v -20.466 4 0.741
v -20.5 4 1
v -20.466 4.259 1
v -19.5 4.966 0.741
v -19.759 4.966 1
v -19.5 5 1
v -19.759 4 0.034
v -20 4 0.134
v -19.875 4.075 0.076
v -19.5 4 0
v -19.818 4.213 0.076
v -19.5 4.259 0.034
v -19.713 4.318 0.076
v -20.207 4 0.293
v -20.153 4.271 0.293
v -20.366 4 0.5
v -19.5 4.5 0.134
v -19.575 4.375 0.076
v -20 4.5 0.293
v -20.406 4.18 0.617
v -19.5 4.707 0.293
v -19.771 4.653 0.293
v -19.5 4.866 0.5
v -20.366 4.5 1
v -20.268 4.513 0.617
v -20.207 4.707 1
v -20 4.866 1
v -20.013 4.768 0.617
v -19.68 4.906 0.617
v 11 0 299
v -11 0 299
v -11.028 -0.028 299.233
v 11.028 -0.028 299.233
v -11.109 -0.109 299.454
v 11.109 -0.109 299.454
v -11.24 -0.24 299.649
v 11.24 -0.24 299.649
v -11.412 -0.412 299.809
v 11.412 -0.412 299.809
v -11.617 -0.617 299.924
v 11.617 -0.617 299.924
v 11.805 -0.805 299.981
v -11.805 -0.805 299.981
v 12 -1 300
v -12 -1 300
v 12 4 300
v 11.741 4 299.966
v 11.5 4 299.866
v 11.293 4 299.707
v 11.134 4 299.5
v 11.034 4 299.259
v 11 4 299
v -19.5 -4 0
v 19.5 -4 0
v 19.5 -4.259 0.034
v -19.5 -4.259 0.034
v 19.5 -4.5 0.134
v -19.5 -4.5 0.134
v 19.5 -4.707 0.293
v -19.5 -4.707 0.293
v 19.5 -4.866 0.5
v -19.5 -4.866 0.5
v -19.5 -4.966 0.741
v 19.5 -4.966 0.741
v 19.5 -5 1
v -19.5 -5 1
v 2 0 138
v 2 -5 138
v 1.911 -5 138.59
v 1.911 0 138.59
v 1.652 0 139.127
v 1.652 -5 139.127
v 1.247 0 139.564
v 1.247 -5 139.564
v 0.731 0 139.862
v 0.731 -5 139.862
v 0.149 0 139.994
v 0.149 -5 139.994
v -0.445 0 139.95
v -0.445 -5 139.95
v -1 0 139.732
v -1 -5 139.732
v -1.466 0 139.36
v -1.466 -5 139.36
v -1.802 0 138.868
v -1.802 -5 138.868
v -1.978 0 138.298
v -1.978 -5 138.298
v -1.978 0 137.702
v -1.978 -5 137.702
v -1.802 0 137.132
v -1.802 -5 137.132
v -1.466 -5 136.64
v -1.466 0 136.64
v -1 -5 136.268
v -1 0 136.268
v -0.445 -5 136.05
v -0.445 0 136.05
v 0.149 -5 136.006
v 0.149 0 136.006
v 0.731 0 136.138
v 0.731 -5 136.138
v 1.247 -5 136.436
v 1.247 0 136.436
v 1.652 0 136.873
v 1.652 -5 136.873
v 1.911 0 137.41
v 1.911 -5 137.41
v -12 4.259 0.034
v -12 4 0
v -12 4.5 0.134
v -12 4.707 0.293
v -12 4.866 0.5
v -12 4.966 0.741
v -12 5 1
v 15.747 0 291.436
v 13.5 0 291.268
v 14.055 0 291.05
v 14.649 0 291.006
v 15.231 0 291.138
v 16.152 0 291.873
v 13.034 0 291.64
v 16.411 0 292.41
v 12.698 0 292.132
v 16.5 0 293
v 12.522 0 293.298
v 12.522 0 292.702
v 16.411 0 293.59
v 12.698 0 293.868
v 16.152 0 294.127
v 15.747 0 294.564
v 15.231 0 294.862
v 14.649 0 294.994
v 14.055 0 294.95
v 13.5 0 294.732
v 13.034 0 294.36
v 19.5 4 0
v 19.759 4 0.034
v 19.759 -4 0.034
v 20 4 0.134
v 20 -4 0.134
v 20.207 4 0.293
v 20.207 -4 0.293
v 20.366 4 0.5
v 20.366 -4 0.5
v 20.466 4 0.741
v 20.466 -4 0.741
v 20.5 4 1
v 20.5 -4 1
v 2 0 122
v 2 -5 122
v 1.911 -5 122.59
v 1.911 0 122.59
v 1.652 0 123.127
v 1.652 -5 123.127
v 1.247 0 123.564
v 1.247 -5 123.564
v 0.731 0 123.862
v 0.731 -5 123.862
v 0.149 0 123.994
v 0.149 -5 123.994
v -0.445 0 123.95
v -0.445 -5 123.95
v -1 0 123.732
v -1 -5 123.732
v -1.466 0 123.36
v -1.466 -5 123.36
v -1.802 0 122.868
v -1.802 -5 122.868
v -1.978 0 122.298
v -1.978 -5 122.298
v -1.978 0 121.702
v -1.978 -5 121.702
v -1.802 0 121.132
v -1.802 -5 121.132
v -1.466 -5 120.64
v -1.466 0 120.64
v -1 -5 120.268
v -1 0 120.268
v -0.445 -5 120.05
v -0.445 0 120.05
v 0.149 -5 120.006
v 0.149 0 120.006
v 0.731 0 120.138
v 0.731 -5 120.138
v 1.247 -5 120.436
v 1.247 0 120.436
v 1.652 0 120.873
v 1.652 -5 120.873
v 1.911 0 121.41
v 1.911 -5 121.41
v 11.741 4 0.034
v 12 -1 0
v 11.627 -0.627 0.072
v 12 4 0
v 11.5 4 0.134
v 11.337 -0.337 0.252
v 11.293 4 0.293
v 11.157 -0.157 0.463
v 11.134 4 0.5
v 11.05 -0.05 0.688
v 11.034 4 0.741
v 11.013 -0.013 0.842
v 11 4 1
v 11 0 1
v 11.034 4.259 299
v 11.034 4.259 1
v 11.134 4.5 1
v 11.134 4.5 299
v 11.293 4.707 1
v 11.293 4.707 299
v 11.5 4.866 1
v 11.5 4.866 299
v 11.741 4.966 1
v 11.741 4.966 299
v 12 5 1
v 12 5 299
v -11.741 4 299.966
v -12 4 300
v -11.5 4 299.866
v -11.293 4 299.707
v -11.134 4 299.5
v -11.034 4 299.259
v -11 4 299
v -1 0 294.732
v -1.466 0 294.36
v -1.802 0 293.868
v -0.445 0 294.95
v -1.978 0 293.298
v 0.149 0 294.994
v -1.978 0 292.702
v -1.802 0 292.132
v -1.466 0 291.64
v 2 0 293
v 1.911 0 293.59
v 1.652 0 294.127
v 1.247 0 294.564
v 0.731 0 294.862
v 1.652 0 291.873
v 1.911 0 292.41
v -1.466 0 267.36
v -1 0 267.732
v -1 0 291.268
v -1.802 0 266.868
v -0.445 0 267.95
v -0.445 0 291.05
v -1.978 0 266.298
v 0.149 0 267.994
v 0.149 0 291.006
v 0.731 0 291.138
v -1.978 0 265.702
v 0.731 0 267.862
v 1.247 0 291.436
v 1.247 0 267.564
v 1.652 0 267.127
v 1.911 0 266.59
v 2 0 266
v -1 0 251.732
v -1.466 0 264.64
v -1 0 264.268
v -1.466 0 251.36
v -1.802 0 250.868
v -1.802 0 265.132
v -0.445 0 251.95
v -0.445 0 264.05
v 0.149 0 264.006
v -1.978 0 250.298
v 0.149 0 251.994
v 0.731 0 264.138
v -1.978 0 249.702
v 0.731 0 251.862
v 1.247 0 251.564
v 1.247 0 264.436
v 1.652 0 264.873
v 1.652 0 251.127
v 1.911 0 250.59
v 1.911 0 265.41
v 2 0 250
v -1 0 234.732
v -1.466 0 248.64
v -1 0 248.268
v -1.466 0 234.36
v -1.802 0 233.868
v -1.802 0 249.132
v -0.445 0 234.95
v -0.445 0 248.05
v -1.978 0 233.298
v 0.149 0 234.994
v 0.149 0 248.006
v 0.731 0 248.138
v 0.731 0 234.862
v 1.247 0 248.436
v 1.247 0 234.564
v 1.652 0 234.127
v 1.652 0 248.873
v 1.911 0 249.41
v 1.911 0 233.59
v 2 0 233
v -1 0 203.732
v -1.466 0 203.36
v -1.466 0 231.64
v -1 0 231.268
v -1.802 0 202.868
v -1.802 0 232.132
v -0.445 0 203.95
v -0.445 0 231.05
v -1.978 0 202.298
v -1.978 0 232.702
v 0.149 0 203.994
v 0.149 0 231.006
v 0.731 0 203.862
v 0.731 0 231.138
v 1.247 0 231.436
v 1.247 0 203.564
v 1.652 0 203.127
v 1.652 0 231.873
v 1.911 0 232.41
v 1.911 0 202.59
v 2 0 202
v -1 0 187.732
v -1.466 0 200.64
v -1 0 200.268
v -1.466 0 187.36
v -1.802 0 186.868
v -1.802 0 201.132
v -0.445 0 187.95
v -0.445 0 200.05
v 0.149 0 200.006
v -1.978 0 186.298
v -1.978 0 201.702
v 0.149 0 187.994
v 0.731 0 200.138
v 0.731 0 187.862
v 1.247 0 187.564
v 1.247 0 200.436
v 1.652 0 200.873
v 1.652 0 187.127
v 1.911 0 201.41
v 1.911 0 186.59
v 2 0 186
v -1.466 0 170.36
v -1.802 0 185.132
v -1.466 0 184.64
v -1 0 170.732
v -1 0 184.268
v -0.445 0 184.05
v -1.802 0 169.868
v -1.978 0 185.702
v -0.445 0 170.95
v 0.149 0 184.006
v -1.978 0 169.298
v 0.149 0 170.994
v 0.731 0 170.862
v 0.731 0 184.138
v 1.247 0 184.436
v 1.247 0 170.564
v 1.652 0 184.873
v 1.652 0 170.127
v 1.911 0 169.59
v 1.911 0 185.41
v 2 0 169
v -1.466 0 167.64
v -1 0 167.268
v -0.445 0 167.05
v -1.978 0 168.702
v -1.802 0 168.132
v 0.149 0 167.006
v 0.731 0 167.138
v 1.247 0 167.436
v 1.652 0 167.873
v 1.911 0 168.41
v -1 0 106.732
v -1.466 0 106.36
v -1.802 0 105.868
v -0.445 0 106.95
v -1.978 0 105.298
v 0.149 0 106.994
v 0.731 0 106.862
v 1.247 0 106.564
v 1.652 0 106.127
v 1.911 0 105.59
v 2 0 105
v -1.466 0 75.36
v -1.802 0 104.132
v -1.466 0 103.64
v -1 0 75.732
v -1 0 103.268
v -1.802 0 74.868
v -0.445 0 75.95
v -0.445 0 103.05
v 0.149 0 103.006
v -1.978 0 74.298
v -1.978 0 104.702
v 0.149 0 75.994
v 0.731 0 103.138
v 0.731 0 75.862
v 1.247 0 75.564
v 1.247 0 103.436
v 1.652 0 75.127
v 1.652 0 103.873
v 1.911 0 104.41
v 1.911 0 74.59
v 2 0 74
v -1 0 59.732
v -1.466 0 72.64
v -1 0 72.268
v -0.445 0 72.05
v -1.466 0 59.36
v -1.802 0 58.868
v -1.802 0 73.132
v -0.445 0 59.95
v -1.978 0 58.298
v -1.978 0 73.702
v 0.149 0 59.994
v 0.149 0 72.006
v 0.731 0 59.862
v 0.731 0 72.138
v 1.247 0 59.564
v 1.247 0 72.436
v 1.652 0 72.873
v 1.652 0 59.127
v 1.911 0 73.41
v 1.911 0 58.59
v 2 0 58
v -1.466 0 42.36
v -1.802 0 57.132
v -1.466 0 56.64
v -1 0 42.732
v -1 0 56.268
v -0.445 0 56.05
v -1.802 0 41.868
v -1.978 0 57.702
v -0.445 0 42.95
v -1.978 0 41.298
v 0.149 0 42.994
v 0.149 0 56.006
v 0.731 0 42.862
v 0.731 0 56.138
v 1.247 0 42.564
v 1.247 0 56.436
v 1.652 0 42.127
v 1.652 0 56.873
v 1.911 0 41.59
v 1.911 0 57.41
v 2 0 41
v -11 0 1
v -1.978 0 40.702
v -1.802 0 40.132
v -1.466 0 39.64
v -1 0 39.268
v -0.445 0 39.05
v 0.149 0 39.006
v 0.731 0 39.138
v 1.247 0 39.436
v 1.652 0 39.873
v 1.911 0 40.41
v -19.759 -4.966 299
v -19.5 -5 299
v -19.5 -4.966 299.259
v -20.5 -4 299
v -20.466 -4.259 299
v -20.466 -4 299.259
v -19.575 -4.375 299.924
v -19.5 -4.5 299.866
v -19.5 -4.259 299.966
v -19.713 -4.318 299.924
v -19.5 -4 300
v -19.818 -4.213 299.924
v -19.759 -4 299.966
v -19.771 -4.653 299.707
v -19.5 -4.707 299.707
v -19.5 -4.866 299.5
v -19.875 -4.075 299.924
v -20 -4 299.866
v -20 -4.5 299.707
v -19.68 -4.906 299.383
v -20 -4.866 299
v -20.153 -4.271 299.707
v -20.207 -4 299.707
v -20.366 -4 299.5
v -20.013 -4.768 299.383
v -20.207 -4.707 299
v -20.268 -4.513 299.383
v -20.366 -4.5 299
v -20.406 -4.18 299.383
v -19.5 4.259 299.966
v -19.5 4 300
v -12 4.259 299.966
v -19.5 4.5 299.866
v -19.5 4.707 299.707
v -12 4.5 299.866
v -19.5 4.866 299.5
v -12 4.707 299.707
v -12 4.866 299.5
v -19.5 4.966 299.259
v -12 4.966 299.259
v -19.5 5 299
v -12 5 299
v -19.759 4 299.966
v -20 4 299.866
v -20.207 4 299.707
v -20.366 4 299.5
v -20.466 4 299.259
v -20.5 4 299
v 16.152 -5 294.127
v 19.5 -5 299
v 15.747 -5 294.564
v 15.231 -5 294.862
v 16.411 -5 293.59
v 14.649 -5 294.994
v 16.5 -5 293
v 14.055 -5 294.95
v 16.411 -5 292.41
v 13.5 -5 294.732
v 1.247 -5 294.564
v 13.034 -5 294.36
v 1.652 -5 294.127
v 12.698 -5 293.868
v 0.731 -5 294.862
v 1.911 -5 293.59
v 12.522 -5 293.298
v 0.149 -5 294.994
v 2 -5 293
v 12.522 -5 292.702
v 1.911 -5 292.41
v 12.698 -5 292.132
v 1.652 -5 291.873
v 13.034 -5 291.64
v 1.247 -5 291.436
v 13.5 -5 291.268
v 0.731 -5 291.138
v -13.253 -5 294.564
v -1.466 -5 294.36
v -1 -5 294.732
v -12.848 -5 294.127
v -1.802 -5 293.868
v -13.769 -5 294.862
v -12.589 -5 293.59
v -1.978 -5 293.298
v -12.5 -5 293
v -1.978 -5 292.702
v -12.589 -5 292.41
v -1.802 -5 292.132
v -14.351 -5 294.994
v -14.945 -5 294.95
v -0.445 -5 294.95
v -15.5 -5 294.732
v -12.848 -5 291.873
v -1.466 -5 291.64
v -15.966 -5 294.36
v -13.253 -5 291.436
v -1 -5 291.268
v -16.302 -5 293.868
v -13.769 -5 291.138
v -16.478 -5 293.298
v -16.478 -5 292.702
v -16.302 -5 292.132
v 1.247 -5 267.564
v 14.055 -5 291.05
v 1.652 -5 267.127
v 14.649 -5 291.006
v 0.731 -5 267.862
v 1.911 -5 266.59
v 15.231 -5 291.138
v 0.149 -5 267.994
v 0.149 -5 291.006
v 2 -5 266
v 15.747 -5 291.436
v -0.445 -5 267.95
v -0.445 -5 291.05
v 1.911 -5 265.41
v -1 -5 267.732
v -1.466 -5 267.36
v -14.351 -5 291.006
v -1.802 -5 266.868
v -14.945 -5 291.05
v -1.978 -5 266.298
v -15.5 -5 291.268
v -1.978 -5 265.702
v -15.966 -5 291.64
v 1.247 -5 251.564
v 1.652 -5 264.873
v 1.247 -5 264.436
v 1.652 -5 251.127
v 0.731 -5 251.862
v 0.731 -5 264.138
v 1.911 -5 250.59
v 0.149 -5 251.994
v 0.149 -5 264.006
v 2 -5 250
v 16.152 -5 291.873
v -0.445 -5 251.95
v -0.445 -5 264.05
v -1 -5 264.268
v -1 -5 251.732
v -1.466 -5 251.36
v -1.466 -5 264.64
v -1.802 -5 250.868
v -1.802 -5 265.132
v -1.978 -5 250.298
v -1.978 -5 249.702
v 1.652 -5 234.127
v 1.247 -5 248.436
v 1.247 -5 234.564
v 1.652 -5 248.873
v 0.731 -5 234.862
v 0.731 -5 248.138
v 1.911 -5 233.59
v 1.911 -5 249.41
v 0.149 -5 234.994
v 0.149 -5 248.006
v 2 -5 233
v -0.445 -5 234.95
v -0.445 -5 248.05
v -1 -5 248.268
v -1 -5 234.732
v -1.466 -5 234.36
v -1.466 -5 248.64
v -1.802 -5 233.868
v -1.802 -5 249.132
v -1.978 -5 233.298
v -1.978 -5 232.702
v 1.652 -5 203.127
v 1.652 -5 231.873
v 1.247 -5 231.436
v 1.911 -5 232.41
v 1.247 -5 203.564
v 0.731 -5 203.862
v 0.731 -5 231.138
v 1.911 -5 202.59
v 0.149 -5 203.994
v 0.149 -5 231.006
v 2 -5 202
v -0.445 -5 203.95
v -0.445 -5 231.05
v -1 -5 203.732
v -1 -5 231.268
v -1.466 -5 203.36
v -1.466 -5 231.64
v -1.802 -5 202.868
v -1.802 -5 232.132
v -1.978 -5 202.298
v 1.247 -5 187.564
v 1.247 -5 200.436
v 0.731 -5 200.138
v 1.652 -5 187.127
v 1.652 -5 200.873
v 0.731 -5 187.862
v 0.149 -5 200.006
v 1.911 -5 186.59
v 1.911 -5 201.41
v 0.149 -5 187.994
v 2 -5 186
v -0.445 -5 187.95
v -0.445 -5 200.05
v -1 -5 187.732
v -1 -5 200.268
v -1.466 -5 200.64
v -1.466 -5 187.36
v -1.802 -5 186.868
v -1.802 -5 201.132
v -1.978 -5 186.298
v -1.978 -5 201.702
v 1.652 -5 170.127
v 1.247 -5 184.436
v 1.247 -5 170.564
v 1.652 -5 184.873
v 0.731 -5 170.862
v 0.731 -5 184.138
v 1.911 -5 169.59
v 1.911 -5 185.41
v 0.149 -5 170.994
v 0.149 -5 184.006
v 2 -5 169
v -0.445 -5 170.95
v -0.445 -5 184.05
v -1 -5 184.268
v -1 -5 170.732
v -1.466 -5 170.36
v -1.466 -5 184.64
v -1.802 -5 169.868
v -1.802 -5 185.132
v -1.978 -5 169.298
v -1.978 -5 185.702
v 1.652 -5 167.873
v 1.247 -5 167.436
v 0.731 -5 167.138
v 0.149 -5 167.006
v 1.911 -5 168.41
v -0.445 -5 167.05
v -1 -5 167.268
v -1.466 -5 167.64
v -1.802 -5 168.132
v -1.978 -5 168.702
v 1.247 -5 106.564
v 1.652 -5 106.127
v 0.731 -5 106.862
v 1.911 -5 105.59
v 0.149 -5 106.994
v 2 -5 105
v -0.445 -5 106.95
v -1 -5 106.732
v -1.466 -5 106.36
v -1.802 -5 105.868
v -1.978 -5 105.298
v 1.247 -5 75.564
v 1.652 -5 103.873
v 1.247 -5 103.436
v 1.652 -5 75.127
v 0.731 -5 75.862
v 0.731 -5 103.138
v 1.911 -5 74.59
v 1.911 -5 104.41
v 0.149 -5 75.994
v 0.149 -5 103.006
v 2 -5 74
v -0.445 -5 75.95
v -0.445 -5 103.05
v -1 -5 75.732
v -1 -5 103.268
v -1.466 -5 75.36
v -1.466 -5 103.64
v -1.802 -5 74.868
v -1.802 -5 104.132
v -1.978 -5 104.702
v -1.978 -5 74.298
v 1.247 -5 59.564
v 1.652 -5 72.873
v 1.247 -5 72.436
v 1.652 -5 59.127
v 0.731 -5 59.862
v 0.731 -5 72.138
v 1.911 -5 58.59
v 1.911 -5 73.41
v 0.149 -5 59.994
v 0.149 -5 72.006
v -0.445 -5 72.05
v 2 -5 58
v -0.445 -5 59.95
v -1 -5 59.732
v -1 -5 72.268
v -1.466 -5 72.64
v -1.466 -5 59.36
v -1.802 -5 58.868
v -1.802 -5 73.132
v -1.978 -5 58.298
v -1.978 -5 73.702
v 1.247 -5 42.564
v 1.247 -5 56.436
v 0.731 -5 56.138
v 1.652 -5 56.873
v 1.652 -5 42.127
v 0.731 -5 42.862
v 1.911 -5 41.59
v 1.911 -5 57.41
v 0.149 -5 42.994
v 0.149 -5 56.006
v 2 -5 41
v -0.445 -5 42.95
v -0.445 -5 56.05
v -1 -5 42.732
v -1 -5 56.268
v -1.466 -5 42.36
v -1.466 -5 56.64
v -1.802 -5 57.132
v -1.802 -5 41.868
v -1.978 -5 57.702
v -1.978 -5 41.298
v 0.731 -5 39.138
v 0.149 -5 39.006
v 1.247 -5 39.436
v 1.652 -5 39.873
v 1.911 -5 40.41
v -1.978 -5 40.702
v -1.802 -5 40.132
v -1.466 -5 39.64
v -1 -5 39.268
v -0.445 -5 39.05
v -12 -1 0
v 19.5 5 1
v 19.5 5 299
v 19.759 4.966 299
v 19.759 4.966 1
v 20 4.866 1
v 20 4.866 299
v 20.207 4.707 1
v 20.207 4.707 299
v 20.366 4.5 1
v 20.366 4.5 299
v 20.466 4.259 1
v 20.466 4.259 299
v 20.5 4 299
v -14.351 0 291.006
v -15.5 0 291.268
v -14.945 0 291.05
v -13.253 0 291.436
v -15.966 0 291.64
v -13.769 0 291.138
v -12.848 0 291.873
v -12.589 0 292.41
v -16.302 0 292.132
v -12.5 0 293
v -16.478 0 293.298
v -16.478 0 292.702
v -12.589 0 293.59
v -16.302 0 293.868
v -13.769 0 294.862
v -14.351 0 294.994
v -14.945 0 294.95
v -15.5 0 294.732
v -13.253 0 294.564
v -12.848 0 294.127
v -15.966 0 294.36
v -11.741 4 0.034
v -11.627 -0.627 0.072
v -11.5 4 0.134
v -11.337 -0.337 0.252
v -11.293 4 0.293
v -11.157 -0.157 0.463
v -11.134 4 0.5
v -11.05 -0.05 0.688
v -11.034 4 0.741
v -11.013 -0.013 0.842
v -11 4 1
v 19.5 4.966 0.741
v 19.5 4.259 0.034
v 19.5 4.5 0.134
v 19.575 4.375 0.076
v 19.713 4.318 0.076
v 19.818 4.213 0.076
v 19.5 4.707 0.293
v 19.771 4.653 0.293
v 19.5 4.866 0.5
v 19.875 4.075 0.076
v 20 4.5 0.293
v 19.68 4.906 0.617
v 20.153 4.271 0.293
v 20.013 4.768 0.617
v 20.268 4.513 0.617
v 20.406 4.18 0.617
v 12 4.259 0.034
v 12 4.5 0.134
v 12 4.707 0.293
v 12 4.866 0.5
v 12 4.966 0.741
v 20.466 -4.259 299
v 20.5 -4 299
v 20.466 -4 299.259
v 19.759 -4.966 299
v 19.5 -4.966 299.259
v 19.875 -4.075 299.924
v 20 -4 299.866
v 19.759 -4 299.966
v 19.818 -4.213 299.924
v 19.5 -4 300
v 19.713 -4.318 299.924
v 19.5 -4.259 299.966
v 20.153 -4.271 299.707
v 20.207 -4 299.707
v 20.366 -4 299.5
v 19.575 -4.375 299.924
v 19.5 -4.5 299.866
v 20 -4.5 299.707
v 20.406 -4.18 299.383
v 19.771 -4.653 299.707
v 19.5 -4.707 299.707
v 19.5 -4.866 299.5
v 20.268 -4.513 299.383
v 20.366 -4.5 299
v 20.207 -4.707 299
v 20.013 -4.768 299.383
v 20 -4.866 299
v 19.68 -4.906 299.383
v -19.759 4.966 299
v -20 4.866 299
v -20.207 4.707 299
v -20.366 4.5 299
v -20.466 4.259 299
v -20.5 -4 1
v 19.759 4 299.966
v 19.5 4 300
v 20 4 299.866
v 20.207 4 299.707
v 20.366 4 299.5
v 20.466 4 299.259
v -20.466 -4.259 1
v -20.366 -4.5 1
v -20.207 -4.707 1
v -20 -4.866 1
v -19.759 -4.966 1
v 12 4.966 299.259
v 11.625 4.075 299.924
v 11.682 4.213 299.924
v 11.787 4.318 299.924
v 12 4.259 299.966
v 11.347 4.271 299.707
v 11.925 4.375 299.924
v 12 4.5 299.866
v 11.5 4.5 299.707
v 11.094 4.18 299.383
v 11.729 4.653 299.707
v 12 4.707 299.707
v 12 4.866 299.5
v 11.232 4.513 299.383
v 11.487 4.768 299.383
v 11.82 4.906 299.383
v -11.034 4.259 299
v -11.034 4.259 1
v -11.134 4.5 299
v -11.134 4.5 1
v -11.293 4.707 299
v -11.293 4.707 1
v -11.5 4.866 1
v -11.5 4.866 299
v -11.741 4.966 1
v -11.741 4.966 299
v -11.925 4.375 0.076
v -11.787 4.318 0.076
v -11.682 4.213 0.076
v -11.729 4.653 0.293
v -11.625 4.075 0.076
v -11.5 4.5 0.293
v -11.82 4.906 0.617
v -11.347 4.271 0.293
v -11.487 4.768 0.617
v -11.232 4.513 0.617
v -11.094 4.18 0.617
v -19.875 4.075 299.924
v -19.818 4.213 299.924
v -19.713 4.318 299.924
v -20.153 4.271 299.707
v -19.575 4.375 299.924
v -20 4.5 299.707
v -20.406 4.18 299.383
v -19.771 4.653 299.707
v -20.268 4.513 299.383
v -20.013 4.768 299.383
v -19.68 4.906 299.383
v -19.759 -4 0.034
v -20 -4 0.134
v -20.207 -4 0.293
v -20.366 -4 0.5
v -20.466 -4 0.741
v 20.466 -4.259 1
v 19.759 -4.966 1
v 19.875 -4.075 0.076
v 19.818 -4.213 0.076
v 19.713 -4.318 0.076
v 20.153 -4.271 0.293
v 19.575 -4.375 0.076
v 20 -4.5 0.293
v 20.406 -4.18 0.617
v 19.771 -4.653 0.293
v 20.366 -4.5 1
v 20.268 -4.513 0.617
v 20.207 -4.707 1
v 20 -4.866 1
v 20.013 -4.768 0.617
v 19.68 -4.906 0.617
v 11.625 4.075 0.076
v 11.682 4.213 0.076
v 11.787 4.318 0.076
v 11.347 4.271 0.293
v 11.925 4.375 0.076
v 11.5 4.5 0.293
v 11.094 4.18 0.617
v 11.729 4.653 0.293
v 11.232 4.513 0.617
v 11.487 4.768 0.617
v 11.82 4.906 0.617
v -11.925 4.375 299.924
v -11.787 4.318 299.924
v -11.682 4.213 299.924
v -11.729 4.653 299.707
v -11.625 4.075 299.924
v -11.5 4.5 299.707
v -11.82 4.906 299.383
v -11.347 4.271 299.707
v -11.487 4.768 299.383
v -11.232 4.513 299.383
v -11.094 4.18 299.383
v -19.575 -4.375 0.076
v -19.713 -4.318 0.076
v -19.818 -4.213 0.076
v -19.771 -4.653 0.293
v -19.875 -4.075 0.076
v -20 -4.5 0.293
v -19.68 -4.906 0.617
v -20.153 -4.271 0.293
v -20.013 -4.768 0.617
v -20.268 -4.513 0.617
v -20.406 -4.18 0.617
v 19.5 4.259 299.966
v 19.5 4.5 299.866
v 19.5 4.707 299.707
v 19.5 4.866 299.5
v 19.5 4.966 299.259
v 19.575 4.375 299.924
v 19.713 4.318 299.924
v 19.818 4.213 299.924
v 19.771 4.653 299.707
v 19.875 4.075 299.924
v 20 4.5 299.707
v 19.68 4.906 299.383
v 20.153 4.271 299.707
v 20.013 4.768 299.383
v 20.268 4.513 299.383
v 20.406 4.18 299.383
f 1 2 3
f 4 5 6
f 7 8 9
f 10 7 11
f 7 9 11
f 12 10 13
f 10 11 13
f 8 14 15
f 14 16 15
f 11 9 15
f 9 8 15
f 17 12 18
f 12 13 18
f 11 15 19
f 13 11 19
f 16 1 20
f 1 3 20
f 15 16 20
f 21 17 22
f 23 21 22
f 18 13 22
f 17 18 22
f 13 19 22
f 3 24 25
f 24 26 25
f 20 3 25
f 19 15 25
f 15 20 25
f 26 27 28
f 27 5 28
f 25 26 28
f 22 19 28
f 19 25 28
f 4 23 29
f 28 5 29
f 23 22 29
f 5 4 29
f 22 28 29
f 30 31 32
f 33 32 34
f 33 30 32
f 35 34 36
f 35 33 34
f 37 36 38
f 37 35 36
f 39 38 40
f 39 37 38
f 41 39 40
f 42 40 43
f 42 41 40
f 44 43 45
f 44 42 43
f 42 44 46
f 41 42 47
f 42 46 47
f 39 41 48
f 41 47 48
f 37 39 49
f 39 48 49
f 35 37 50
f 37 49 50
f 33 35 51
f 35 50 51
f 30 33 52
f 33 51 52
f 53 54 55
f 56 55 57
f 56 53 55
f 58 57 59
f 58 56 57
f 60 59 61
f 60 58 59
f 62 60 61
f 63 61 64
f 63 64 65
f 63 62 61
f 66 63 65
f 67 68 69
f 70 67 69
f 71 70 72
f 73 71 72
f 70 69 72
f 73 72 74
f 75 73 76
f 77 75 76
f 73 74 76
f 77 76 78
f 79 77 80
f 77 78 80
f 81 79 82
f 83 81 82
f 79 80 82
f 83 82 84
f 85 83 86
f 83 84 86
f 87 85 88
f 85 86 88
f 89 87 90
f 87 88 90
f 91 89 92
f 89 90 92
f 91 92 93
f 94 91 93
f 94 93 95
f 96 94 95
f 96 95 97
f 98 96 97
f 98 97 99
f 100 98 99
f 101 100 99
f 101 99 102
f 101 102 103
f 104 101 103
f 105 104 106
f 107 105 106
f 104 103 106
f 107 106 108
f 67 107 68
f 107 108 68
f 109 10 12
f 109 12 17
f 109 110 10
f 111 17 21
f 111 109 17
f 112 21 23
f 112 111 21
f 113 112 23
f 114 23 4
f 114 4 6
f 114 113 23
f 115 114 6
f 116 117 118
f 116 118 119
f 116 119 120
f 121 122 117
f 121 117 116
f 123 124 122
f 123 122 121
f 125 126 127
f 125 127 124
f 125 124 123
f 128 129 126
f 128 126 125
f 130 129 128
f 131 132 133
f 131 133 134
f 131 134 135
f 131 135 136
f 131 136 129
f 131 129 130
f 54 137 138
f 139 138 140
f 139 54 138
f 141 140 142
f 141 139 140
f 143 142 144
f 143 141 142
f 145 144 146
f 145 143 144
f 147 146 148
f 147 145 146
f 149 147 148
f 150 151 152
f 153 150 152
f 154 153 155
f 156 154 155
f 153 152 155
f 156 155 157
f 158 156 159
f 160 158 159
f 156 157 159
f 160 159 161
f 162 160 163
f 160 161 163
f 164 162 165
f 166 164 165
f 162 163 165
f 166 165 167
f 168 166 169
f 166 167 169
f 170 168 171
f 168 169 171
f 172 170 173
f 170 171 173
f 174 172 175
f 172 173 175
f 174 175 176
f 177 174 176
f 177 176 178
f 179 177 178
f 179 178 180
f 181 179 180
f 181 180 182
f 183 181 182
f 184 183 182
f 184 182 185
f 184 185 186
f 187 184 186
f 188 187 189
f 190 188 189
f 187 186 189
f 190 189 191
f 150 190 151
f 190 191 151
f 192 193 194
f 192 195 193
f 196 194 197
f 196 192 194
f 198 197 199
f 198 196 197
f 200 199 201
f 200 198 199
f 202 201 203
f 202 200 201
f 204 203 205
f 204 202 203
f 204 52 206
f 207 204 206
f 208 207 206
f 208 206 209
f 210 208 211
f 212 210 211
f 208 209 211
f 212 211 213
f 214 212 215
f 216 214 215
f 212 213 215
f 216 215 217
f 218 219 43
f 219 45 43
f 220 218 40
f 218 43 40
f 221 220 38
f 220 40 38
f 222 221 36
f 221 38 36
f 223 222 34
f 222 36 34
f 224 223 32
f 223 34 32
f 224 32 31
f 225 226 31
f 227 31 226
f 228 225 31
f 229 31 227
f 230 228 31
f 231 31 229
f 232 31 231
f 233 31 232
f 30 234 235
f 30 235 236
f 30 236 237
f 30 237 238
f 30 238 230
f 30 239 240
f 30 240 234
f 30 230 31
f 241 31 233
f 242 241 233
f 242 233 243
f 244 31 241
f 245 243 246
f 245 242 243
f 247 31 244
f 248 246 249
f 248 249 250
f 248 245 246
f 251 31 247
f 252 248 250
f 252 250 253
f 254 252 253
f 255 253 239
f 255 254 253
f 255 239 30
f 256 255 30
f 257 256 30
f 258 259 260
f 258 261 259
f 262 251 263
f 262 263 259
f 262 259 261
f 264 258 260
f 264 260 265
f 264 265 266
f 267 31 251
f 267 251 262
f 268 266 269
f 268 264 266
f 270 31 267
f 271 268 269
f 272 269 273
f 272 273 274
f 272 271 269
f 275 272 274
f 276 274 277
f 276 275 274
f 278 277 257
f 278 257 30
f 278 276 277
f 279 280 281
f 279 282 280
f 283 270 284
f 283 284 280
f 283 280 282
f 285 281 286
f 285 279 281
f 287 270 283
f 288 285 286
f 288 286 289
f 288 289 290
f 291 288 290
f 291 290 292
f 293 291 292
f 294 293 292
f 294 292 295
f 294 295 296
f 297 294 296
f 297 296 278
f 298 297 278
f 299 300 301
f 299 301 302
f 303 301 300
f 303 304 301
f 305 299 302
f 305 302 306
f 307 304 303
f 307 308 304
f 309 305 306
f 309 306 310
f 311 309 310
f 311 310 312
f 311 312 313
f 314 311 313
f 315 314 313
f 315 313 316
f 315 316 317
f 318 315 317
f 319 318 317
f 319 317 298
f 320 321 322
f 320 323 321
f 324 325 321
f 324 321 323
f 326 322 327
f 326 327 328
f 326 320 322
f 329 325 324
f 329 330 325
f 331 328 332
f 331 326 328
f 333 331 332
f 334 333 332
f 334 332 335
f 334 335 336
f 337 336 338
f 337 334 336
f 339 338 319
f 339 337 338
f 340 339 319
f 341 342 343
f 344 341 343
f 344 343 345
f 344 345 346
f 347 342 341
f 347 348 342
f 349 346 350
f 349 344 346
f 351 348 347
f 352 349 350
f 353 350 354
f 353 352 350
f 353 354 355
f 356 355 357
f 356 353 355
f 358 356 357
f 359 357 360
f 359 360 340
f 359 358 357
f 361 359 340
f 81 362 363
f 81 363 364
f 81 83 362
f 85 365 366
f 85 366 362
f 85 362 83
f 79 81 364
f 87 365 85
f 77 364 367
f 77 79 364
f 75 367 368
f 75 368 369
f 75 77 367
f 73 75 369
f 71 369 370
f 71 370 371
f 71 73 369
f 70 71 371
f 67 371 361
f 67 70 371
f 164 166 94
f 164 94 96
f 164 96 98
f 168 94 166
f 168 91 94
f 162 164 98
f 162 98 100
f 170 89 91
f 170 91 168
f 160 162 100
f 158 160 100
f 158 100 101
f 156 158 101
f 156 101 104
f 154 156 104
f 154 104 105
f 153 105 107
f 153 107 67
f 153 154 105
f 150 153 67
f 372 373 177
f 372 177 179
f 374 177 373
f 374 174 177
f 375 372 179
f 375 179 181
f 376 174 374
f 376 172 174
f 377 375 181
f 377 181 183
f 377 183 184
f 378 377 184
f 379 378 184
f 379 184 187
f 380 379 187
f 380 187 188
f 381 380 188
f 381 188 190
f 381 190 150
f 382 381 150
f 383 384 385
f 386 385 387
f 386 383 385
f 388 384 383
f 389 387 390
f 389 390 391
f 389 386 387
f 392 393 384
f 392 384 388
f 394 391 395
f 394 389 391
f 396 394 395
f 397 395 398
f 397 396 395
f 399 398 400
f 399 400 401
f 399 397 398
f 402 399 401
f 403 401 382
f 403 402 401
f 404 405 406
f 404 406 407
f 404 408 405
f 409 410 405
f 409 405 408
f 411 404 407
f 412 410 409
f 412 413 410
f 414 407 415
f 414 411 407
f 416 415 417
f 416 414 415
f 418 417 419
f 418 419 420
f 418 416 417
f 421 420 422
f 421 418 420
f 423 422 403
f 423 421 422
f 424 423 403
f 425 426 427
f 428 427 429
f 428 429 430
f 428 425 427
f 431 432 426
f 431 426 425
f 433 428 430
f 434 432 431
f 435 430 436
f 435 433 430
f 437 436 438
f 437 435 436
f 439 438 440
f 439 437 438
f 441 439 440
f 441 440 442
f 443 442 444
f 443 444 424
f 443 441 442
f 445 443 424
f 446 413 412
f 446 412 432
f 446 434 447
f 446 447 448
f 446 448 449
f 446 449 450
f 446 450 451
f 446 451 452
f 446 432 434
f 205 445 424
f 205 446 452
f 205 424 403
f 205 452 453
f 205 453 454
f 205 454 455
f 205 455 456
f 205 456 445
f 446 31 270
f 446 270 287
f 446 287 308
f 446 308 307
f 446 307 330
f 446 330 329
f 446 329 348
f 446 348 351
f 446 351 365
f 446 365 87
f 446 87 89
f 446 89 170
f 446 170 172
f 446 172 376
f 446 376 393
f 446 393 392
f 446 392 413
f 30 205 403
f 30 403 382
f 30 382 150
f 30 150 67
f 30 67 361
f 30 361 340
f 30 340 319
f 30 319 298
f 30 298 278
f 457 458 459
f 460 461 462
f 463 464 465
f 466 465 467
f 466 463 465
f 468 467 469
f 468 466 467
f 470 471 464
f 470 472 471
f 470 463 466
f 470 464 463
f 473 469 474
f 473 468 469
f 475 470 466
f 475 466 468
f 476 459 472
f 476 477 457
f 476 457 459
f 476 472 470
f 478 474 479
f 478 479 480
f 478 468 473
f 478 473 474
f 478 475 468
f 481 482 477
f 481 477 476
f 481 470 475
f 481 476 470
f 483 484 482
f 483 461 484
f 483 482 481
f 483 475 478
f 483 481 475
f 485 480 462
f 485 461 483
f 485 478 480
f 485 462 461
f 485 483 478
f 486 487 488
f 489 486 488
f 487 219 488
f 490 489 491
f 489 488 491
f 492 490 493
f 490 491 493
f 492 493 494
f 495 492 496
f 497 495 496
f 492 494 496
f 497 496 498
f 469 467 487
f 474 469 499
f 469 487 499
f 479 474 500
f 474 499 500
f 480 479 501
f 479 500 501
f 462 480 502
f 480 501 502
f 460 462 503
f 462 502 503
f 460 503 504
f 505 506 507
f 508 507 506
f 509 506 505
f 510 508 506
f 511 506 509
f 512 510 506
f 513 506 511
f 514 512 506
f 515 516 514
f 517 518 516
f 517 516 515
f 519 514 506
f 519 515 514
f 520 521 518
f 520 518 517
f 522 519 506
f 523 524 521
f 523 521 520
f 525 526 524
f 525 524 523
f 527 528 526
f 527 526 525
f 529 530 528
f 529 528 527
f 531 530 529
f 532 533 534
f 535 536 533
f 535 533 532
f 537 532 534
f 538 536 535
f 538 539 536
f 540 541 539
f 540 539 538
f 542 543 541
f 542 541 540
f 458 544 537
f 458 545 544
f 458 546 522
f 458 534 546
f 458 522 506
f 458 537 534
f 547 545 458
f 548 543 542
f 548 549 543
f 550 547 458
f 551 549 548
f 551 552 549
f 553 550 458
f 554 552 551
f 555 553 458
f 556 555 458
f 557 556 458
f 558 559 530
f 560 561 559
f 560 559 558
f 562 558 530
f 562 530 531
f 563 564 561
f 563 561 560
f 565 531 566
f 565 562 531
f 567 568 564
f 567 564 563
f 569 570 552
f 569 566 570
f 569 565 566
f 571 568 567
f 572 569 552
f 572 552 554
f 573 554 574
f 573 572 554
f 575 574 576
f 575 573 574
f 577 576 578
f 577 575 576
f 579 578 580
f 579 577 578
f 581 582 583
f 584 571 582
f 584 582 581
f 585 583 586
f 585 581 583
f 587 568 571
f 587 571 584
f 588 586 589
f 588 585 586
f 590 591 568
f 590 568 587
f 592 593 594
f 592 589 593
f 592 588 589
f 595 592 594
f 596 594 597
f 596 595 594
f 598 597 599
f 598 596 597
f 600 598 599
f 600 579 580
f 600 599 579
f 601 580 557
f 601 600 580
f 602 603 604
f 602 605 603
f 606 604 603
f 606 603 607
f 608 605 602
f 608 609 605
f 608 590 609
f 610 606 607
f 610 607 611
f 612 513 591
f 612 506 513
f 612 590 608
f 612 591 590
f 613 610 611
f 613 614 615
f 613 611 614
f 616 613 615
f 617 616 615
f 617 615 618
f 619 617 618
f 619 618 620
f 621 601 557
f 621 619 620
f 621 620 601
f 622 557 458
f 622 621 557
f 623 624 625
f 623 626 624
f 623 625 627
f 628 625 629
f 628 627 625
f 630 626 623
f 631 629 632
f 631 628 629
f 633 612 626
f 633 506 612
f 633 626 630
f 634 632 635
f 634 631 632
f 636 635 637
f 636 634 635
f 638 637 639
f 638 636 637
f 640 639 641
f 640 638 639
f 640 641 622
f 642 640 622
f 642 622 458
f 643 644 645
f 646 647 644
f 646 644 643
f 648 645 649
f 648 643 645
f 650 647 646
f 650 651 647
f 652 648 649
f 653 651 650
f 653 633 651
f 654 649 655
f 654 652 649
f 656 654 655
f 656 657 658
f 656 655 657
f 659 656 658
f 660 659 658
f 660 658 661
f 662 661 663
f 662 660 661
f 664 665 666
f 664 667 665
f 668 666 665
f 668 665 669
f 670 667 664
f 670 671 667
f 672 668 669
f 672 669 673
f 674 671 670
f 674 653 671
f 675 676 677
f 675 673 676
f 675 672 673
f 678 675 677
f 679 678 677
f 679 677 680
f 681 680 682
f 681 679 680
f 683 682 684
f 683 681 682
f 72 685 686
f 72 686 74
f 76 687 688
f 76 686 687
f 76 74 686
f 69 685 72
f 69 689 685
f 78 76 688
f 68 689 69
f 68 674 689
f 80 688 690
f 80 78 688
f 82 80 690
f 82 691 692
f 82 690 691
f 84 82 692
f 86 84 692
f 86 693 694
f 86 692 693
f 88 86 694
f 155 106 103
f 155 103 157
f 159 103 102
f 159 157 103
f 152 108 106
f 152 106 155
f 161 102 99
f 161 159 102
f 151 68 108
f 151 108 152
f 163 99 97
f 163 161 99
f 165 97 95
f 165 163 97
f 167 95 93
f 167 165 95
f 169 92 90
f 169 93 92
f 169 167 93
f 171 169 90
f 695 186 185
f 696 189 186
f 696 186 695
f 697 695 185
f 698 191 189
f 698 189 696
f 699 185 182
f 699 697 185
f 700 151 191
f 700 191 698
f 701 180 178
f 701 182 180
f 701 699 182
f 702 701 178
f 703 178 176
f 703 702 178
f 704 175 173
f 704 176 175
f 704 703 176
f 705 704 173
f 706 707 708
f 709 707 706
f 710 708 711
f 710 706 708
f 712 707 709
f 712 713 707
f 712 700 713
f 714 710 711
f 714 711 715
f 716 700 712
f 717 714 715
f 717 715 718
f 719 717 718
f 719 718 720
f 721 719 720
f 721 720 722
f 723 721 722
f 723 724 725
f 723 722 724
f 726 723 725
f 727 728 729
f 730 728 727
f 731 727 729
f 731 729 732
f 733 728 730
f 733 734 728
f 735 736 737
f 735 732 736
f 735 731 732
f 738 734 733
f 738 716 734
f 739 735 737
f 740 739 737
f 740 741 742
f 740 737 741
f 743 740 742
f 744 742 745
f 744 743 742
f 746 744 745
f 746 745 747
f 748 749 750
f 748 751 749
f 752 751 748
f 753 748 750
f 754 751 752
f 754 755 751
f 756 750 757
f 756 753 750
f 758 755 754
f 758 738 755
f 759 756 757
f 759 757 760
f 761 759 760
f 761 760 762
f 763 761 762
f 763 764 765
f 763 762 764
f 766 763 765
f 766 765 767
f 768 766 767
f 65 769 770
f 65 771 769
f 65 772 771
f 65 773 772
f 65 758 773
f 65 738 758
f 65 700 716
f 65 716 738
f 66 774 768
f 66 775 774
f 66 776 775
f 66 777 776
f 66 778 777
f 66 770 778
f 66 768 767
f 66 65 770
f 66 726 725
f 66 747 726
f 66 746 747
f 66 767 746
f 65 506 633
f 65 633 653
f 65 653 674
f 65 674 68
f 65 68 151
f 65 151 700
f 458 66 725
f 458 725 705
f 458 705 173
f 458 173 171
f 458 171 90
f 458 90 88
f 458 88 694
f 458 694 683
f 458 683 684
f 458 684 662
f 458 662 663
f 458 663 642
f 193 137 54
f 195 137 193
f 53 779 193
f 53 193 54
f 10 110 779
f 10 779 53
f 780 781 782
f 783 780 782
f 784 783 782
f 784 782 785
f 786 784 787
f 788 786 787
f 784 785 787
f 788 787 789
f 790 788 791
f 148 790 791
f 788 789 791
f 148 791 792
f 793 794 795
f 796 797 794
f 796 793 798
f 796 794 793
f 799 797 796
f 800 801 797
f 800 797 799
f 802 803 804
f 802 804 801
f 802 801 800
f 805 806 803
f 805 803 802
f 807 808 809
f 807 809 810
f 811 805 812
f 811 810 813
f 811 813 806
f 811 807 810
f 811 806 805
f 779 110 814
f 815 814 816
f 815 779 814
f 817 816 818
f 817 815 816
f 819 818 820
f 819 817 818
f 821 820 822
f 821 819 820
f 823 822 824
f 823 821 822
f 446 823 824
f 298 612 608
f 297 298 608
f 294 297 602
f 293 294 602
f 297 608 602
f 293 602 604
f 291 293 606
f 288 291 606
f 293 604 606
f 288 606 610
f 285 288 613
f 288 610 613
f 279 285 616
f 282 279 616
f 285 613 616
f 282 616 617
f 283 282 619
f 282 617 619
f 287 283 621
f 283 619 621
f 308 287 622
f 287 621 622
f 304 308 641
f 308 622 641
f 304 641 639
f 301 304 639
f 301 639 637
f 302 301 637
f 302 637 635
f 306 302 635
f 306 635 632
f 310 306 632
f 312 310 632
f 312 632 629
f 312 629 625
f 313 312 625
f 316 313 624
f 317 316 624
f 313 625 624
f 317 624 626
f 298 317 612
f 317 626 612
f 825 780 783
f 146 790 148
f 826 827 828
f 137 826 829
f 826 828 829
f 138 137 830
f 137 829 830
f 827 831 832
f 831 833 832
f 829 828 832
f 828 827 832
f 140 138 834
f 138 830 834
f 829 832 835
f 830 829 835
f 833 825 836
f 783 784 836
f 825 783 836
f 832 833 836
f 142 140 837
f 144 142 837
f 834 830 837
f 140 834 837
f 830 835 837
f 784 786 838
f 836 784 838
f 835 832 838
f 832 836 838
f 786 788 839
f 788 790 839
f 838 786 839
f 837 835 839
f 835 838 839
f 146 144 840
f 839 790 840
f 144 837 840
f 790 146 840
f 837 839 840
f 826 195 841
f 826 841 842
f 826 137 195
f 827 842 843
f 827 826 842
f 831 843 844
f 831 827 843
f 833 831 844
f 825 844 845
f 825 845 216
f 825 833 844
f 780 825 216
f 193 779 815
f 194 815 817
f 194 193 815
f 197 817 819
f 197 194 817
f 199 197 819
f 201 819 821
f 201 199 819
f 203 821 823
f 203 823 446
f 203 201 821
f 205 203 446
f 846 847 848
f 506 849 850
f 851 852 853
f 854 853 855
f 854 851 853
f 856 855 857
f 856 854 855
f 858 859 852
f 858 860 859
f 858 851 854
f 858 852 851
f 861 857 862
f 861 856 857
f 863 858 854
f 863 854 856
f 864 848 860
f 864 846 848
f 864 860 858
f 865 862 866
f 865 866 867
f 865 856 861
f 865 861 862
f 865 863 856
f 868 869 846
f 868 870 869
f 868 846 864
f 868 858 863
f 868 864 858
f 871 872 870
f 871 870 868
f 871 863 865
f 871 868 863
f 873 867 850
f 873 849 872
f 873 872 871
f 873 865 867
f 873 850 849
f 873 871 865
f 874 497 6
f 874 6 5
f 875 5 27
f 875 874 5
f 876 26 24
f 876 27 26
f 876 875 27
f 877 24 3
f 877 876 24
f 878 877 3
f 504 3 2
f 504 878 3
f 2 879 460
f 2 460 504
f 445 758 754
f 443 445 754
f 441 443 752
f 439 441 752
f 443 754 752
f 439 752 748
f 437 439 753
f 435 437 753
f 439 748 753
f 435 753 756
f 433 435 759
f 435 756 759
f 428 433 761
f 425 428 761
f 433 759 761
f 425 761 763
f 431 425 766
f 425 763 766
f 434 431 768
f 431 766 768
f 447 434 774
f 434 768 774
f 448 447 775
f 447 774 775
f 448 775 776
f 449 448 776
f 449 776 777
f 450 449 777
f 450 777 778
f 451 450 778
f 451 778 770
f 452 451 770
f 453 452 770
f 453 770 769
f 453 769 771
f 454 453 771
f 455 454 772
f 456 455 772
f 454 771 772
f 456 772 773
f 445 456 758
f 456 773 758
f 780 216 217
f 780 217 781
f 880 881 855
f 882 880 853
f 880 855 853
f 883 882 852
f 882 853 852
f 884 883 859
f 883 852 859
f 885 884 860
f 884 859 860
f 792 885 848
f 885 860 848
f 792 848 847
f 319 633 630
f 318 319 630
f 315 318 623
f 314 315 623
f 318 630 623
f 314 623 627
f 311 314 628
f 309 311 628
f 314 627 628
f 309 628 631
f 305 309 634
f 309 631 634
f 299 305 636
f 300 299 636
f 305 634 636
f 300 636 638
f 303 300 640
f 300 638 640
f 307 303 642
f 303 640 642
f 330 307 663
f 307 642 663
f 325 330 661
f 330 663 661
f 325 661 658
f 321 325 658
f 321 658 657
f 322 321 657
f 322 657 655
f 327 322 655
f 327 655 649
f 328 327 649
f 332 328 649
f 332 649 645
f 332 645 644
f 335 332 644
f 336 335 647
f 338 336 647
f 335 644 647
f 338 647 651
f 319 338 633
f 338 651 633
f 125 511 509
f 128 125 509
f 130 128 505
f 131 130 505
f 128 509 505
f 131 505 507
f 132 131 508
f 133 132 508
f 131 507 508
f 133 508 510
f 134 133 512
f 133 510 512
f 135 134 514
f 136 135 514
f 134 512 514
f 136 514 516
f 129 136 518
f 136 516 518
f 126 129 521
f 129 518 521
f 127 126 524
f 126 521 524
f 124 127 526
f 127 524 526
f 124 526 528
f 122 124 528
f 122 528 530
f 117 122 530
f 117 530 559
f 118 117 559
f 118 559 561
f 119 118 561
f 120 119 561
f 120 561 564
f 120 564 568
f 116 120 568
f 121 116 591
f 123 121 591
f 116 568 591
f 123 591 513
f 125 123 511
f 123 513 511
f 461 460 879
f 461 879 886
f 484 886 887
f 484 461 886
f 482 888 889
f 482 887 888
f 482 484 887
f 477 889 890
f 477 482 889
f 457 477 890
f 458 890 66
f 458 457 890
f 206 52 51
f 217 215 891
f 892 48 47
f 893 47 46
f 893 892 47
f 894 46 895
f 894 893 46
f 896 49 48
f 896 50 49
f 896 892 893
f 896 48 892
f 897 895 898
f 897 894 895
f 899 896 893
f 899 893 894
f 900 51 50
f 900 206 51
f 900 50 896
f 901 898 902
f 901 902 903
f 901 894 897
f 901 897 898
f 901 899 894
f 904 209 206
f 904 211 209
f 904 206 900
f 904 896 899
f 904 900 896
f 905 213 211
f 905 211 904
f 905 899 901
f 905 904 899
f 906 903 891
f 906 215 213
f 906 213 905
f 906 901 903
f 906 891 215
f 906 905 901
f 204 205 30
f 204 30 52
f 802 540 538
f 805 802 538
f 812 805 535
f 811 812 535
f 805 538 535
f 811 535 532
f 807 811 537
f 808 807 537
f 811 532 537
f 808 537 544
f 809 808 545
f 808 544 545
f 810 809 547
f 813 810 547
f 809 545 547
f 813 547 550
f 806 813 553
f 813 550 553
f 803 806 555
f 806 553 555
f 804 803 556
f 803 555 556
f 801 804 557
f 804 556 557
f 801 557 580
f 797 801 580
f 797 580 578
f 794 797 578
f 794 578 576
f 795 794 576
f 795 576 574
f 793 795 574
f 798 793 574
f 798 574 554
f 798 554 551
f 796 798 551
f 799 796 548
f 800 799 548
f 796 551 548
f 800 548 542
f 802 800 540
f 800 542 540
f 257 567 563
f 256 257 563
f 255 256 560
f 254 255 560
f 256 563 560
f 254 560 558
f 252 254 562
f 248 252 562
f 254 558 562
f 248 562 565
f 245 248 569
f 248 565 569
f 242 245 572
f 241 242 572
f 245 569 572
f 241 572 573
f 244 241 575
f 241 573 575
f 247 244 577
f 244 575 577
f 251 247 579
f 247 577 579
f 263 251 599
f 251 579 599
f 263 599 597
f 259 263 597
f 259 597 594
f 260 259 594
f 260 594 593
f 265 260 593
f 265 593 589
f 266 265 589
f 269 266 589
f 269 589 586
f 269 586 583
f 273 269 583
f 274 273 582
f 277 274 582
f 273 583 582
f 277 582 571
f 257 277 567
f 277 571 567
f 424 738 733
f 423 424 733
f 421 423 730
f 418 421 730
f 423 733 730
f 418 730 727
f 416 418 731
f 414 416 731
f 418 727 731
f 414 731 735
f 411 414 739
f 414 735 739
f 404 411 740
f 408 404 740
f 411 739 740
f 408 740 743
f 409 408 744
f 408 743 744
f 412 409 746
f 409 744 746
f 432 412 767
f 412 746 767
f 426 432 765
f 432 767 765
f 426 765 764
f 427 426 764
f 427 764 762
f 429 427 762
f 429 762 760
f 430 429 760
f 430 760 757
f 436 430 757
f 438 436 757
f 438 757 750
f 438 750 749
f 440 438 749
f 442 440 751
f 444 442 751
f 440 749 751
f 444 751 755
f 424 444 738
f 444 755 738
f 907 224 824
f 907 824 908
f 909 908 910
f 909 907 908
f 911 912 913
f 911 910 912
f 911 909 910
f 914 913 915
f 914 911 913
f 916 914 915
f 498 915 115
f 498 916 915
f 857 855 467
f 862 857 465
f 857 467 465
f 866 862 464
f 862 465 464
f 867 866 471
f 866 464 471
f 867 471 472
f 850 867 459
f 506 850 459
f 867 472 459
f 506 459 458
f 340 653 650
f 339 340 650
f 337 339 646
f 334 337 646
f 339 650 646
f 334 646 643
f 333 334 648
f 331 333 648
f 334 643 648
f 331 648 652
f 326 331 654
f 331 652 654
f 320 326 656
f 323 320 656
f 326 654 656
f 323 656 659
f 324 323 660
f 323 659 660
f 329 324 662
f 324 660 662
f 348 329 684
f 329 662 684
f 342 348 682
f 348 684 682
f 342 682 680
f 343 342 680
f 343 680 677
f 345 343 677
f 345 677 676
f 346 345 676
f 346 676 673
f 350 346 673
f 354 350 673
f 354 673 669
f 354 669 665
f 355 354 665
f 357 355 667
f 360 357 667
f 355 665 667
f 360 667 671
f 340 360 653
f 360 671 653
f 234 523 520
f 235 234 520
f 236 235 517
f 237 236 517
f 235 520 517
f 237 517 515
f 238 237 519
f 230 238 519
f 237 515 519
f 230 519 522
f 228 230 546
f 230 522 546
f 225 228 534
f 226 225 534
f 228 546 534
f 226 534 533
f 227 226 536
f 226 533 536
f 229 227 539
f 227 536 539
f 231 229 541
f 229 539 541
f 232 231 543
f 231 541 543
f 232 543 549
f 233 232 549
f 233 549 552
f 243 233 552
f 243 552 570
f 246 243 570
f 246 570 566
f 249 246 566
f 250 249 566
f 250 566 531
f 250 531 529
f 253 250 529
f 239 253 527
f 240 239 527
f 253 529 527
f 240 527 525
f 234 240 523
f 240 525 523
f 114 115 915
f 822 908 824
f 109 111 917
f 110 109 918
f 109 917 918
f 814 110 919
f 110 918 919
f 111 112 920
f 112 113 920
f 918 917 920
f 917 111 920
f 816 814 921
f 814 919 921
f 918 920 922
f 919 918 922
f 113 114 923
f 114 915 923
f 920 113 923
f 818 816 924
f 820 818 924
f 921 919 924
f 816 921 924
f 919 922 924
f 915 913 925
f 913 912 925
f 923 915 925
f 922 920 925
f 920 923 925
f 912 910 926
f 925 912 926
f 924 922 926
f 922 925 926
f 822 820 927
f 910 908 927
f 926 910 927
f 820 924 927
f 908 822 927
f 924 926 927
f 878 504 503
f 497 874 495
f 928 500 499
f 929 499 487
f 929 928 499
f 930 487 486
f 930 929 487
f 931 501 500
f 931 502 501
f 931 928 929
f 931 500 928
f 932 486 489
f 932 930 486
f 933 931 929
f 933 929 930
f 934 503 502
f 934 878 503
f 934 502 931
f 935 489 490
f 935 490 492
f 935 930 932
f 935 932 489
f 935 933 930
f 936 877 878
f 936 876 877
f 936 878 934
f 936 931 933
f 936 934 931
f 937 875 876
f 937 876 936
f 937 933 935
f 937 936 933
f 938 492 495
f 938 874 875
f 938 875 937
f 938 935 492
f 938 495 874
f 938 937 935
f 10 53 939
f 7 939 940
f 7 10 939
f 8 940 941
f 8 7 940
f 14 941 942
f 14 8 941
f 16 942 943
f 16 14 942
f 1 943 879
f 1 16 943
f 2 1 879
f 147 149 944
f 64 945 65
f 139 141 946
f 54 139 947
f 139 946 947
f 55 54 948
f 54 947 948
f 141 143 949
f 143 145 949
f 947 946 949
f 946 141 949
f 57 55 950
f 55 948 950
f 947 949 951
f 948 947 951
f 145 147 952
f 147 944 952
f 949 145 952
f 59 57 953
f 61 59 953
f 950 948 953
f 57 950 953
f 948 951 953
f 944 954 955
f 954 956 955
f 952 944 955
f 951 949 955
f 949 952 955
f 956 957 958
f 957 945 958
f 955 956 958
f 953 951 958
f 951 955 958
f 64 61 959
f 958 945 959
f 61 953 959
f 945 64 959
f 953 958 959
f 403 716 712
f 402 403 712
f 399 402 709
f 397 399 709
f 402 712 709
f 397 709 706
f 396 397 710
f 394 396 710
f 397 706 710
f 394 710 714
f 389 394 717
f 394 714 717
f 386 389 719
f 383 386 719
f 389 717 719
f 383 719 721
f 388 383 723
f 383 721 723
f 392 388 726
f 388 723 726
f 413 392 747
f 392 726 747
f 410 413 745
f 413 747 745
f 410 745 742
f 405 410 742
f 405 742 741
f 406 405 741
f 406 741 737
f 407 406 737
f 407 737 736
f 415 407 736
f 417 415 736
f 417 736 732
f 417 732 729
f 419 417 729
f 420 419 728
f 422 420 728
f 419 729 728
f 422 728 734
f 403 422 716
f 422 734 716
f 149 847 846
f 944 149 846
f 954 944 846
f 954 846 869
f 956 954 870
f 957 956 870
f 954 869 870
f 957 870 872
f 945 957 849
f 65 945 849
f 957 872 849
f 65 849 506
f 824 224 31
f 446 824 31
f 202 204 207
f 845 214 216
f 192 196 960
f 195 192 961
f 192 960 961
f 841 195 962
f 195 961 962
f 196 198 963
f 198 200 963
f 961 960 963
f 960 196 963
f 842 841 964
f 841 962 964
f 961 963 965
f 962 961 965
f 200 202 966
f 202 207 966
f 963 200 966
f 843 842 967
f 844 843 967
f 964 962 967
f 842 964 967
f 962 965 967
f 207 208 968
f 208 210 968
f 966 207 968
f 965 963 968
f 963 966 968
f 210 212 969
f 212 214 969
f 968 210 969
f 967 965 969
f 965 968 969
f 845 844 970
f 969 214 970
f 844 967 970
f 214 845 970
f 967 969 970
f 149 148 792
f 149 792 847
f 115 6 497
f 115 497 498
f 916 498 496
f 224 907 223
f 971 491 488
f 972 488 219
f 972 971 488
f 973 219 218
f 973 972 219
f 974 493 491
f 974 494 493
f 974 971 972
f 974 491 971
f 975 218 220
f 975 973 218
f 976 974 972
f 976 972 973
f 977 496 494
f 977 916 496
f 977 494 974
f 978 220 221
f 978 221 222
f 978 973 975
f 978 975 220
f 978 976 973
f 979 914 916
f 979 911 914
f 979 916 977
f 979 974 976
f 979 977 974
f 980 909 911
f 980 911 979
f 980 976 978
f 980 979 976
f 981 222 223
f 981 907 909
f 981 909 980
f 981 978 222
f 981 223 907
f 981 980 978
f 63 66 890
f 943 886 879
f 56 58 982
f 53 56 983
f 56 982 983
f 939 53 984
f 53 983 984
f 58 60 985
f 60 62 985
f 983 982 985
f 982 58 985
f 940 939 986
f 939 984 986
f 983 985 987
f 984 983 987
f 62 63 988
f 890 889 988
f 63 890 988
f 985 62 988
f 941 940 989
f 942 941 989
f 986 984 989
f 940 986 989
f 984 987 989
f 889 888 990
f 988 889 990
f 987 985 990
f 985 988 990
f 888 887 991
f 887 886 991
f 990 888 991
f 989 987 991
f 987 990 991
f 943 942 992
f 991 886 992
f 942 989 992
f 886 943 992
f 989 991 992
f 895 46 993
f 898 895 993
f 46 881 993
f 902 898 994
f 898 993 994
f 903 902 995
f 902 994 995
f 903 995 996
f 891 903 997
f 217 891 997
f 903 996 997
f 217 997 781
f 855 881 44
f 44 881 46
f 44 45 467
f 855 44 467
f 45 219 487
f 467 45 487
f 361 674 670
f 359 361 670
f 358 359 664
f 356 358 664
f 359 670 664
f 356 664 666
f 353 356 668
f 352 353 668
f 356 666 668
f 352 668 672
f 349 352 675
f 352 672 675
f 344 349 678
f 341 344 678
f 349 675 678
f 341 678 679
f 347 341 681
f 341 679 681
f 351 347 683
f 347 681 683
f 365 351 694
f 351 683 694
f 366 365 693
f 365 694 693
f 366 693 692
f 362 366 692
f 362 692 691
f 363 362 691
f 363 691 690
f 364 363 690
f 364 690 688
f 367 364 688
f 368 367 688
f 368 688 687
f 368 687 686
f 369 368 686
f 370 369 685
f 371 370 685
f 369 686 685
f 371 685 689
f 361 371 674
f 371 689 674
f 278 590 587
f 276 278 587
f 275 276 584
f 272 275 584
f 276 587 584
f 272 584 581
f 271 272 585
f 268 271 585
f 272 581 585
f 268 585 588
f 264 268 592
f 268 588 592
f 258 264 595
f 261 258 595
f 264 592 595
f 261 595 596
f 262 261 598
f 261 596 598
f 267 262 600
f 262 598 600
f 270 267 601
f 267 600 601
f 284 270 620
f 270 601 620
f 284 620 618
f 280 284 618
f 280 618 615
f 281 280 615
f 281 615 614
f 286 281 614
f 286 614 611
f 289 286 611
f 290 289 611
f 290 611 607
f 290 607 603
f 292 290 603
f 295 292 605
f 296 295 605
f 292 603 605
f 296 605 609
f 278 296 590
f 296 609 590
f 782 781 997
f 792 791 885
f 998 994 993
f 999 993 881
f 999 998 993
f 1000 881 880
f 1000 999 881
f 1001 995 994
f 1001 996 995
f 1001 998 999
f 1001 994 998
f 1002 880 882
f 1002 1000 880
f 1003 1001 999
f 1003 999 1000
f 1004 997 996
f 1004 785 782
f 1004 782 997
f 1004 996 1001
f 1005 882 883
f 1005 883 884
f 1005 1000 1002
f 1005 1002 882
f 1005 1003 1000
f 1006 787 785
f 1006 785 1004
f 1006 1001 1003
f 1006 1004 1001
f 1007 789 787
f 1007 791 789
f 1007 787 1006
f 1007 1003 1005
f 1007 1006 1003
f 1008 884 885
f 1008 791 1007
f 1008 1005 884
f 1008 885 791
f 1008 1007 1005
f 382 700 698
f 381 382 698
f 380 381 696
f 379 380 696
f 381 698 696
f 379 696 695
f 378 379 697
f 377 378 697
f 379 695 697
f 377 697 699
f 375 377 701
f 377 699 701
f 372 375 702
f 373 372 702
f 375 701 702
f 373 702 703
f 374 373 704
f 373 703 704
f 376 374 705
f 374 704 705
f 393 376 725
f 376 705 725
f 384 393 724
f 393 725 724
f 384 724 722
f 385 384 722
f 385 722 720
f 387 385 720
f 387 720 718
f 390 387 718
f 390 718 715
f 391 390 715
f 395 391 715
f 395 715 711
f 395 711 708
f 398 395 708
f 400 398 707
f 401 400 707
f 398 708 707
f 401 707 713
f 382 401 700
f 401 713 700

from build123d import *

# Parameters (mm, degrees)
BOSS_EXTRUDE1_DEPTH = 300
SKETCH2_R           = 2
CUT_EXTRUDE1_DEPTH  = 5
FILLET1_R           = 1
FILLET2_R           = 1


with BuildPart() as part:
    # Sketch1 → Boss-Extrude1 (new body)
    with BuildSketch(Plane.XY):
        Polygon((-11, 5), (-11, 0), (11, 0), (11, 5), (20.5, 5), (20.5, -5), (-20.5, -5), (-20.5, 5), align=None)
    extrude(amount=BOSS_EXTRUDE1_DEPTH)

    # Sketch2 → Cut-Extrude1 (cut)
    with BuildSketch(Plane.XZ.offset(5)):
        with Locations((-14.5, 293)):
            Circle(SKETCH2_R)
        with Locations((0, 293)):
            Circle(SKETCH2_R)
        with Locations((14.5, 293)):
            Circle(SKETCH2_R)
        with Locations((0, 266)):
            Circle(SKETCH2_R)
        with Locations((0, 250)):
            Circle(SKETCH2_R)
        with Locations((0, 233)):
            Circle(SKETCH2_R)
        with Locations((0, 169)):
            Circle(SKETCH2_R)
        with Locations((0, 105)):
            Circle(SKETCH2_R)
        with Locations((0, 186)):
            Circle(SKETCH2_R)
        with Locations((0, 122)):
            Circle(SKETCH2_R)
        with Locations((0, 202)):
            Circle(SKETCH2_R)
        with Locations((0, 138)):
            Circle(SKETCH2_R)
        with Locations((0, 74)):
            Circle(SKETCH2_R)
        with Locations((0, 58)):
            Circle(SKETCH2_R)
        with Locations((0, 41)):
            Circle(SKETCH2_R)
    extrude(amount=-CUT_EXTRUDE1_DEPTH, mode=Mode.SUBTRACT)

    # Fillet1
    fillet1_edges = [part.edges().sort_by_distance(p)[0] for p in [
        (20.5, 5, 150),
        (20.5, -5, 150),
        (-20.5, -5, 150),
        (-20.5, 5, 150),
        (-11, 5, 150),
        (11, 5, 150),
    ]]
    fillet(fillet1_edges, radius=FILLET1_R)

    # Fillet2
    fillet2_edges = [part.edges().sort_by_distance(p)[0] for p in [
        (0, 0, 300),
        (20.207106781, -4.707106781, 300),
        (-11.292893219, 4.707106781, 300),
        (11.292893219, 4.707106781, 300),
        (-11, 2, 300),
        (11, 2, 0),
        (11, 2, 300),
        (15.75, 5, 0),
        (20.5, 0, 0),
        (0, -5, 0),
        (-20.5, 0, 0),
        (-15.75, 5, 0),
        (20.207106781, 4.707106781, 0),
        (-20.207106781, 4.707106781, 0),
        (-20.207106781, -4.707106781, 0),
        (20.207106781, -4.707106781, 0),
        (-11, 2, 0),
        (-11.292893219, 4.707106781, 0),
        (11.292893219, 4.707106781, 0),
        (15.75, 5, 300),
        (-15.75, 5, 300),
        (-20.5, 0, 300),
        (0, 0, 0),
        (0, -5, 300),
        (20.5, 0, 300),
        (20.207106781, 4.707106781, 300),
        (-20.207106781, 4.707106781, 300),
        (-20.207106781, -4.707106781, 300),
    ]]
    fillet(fillet2_edges, radius=FILLET2_R)


solid = part.part
